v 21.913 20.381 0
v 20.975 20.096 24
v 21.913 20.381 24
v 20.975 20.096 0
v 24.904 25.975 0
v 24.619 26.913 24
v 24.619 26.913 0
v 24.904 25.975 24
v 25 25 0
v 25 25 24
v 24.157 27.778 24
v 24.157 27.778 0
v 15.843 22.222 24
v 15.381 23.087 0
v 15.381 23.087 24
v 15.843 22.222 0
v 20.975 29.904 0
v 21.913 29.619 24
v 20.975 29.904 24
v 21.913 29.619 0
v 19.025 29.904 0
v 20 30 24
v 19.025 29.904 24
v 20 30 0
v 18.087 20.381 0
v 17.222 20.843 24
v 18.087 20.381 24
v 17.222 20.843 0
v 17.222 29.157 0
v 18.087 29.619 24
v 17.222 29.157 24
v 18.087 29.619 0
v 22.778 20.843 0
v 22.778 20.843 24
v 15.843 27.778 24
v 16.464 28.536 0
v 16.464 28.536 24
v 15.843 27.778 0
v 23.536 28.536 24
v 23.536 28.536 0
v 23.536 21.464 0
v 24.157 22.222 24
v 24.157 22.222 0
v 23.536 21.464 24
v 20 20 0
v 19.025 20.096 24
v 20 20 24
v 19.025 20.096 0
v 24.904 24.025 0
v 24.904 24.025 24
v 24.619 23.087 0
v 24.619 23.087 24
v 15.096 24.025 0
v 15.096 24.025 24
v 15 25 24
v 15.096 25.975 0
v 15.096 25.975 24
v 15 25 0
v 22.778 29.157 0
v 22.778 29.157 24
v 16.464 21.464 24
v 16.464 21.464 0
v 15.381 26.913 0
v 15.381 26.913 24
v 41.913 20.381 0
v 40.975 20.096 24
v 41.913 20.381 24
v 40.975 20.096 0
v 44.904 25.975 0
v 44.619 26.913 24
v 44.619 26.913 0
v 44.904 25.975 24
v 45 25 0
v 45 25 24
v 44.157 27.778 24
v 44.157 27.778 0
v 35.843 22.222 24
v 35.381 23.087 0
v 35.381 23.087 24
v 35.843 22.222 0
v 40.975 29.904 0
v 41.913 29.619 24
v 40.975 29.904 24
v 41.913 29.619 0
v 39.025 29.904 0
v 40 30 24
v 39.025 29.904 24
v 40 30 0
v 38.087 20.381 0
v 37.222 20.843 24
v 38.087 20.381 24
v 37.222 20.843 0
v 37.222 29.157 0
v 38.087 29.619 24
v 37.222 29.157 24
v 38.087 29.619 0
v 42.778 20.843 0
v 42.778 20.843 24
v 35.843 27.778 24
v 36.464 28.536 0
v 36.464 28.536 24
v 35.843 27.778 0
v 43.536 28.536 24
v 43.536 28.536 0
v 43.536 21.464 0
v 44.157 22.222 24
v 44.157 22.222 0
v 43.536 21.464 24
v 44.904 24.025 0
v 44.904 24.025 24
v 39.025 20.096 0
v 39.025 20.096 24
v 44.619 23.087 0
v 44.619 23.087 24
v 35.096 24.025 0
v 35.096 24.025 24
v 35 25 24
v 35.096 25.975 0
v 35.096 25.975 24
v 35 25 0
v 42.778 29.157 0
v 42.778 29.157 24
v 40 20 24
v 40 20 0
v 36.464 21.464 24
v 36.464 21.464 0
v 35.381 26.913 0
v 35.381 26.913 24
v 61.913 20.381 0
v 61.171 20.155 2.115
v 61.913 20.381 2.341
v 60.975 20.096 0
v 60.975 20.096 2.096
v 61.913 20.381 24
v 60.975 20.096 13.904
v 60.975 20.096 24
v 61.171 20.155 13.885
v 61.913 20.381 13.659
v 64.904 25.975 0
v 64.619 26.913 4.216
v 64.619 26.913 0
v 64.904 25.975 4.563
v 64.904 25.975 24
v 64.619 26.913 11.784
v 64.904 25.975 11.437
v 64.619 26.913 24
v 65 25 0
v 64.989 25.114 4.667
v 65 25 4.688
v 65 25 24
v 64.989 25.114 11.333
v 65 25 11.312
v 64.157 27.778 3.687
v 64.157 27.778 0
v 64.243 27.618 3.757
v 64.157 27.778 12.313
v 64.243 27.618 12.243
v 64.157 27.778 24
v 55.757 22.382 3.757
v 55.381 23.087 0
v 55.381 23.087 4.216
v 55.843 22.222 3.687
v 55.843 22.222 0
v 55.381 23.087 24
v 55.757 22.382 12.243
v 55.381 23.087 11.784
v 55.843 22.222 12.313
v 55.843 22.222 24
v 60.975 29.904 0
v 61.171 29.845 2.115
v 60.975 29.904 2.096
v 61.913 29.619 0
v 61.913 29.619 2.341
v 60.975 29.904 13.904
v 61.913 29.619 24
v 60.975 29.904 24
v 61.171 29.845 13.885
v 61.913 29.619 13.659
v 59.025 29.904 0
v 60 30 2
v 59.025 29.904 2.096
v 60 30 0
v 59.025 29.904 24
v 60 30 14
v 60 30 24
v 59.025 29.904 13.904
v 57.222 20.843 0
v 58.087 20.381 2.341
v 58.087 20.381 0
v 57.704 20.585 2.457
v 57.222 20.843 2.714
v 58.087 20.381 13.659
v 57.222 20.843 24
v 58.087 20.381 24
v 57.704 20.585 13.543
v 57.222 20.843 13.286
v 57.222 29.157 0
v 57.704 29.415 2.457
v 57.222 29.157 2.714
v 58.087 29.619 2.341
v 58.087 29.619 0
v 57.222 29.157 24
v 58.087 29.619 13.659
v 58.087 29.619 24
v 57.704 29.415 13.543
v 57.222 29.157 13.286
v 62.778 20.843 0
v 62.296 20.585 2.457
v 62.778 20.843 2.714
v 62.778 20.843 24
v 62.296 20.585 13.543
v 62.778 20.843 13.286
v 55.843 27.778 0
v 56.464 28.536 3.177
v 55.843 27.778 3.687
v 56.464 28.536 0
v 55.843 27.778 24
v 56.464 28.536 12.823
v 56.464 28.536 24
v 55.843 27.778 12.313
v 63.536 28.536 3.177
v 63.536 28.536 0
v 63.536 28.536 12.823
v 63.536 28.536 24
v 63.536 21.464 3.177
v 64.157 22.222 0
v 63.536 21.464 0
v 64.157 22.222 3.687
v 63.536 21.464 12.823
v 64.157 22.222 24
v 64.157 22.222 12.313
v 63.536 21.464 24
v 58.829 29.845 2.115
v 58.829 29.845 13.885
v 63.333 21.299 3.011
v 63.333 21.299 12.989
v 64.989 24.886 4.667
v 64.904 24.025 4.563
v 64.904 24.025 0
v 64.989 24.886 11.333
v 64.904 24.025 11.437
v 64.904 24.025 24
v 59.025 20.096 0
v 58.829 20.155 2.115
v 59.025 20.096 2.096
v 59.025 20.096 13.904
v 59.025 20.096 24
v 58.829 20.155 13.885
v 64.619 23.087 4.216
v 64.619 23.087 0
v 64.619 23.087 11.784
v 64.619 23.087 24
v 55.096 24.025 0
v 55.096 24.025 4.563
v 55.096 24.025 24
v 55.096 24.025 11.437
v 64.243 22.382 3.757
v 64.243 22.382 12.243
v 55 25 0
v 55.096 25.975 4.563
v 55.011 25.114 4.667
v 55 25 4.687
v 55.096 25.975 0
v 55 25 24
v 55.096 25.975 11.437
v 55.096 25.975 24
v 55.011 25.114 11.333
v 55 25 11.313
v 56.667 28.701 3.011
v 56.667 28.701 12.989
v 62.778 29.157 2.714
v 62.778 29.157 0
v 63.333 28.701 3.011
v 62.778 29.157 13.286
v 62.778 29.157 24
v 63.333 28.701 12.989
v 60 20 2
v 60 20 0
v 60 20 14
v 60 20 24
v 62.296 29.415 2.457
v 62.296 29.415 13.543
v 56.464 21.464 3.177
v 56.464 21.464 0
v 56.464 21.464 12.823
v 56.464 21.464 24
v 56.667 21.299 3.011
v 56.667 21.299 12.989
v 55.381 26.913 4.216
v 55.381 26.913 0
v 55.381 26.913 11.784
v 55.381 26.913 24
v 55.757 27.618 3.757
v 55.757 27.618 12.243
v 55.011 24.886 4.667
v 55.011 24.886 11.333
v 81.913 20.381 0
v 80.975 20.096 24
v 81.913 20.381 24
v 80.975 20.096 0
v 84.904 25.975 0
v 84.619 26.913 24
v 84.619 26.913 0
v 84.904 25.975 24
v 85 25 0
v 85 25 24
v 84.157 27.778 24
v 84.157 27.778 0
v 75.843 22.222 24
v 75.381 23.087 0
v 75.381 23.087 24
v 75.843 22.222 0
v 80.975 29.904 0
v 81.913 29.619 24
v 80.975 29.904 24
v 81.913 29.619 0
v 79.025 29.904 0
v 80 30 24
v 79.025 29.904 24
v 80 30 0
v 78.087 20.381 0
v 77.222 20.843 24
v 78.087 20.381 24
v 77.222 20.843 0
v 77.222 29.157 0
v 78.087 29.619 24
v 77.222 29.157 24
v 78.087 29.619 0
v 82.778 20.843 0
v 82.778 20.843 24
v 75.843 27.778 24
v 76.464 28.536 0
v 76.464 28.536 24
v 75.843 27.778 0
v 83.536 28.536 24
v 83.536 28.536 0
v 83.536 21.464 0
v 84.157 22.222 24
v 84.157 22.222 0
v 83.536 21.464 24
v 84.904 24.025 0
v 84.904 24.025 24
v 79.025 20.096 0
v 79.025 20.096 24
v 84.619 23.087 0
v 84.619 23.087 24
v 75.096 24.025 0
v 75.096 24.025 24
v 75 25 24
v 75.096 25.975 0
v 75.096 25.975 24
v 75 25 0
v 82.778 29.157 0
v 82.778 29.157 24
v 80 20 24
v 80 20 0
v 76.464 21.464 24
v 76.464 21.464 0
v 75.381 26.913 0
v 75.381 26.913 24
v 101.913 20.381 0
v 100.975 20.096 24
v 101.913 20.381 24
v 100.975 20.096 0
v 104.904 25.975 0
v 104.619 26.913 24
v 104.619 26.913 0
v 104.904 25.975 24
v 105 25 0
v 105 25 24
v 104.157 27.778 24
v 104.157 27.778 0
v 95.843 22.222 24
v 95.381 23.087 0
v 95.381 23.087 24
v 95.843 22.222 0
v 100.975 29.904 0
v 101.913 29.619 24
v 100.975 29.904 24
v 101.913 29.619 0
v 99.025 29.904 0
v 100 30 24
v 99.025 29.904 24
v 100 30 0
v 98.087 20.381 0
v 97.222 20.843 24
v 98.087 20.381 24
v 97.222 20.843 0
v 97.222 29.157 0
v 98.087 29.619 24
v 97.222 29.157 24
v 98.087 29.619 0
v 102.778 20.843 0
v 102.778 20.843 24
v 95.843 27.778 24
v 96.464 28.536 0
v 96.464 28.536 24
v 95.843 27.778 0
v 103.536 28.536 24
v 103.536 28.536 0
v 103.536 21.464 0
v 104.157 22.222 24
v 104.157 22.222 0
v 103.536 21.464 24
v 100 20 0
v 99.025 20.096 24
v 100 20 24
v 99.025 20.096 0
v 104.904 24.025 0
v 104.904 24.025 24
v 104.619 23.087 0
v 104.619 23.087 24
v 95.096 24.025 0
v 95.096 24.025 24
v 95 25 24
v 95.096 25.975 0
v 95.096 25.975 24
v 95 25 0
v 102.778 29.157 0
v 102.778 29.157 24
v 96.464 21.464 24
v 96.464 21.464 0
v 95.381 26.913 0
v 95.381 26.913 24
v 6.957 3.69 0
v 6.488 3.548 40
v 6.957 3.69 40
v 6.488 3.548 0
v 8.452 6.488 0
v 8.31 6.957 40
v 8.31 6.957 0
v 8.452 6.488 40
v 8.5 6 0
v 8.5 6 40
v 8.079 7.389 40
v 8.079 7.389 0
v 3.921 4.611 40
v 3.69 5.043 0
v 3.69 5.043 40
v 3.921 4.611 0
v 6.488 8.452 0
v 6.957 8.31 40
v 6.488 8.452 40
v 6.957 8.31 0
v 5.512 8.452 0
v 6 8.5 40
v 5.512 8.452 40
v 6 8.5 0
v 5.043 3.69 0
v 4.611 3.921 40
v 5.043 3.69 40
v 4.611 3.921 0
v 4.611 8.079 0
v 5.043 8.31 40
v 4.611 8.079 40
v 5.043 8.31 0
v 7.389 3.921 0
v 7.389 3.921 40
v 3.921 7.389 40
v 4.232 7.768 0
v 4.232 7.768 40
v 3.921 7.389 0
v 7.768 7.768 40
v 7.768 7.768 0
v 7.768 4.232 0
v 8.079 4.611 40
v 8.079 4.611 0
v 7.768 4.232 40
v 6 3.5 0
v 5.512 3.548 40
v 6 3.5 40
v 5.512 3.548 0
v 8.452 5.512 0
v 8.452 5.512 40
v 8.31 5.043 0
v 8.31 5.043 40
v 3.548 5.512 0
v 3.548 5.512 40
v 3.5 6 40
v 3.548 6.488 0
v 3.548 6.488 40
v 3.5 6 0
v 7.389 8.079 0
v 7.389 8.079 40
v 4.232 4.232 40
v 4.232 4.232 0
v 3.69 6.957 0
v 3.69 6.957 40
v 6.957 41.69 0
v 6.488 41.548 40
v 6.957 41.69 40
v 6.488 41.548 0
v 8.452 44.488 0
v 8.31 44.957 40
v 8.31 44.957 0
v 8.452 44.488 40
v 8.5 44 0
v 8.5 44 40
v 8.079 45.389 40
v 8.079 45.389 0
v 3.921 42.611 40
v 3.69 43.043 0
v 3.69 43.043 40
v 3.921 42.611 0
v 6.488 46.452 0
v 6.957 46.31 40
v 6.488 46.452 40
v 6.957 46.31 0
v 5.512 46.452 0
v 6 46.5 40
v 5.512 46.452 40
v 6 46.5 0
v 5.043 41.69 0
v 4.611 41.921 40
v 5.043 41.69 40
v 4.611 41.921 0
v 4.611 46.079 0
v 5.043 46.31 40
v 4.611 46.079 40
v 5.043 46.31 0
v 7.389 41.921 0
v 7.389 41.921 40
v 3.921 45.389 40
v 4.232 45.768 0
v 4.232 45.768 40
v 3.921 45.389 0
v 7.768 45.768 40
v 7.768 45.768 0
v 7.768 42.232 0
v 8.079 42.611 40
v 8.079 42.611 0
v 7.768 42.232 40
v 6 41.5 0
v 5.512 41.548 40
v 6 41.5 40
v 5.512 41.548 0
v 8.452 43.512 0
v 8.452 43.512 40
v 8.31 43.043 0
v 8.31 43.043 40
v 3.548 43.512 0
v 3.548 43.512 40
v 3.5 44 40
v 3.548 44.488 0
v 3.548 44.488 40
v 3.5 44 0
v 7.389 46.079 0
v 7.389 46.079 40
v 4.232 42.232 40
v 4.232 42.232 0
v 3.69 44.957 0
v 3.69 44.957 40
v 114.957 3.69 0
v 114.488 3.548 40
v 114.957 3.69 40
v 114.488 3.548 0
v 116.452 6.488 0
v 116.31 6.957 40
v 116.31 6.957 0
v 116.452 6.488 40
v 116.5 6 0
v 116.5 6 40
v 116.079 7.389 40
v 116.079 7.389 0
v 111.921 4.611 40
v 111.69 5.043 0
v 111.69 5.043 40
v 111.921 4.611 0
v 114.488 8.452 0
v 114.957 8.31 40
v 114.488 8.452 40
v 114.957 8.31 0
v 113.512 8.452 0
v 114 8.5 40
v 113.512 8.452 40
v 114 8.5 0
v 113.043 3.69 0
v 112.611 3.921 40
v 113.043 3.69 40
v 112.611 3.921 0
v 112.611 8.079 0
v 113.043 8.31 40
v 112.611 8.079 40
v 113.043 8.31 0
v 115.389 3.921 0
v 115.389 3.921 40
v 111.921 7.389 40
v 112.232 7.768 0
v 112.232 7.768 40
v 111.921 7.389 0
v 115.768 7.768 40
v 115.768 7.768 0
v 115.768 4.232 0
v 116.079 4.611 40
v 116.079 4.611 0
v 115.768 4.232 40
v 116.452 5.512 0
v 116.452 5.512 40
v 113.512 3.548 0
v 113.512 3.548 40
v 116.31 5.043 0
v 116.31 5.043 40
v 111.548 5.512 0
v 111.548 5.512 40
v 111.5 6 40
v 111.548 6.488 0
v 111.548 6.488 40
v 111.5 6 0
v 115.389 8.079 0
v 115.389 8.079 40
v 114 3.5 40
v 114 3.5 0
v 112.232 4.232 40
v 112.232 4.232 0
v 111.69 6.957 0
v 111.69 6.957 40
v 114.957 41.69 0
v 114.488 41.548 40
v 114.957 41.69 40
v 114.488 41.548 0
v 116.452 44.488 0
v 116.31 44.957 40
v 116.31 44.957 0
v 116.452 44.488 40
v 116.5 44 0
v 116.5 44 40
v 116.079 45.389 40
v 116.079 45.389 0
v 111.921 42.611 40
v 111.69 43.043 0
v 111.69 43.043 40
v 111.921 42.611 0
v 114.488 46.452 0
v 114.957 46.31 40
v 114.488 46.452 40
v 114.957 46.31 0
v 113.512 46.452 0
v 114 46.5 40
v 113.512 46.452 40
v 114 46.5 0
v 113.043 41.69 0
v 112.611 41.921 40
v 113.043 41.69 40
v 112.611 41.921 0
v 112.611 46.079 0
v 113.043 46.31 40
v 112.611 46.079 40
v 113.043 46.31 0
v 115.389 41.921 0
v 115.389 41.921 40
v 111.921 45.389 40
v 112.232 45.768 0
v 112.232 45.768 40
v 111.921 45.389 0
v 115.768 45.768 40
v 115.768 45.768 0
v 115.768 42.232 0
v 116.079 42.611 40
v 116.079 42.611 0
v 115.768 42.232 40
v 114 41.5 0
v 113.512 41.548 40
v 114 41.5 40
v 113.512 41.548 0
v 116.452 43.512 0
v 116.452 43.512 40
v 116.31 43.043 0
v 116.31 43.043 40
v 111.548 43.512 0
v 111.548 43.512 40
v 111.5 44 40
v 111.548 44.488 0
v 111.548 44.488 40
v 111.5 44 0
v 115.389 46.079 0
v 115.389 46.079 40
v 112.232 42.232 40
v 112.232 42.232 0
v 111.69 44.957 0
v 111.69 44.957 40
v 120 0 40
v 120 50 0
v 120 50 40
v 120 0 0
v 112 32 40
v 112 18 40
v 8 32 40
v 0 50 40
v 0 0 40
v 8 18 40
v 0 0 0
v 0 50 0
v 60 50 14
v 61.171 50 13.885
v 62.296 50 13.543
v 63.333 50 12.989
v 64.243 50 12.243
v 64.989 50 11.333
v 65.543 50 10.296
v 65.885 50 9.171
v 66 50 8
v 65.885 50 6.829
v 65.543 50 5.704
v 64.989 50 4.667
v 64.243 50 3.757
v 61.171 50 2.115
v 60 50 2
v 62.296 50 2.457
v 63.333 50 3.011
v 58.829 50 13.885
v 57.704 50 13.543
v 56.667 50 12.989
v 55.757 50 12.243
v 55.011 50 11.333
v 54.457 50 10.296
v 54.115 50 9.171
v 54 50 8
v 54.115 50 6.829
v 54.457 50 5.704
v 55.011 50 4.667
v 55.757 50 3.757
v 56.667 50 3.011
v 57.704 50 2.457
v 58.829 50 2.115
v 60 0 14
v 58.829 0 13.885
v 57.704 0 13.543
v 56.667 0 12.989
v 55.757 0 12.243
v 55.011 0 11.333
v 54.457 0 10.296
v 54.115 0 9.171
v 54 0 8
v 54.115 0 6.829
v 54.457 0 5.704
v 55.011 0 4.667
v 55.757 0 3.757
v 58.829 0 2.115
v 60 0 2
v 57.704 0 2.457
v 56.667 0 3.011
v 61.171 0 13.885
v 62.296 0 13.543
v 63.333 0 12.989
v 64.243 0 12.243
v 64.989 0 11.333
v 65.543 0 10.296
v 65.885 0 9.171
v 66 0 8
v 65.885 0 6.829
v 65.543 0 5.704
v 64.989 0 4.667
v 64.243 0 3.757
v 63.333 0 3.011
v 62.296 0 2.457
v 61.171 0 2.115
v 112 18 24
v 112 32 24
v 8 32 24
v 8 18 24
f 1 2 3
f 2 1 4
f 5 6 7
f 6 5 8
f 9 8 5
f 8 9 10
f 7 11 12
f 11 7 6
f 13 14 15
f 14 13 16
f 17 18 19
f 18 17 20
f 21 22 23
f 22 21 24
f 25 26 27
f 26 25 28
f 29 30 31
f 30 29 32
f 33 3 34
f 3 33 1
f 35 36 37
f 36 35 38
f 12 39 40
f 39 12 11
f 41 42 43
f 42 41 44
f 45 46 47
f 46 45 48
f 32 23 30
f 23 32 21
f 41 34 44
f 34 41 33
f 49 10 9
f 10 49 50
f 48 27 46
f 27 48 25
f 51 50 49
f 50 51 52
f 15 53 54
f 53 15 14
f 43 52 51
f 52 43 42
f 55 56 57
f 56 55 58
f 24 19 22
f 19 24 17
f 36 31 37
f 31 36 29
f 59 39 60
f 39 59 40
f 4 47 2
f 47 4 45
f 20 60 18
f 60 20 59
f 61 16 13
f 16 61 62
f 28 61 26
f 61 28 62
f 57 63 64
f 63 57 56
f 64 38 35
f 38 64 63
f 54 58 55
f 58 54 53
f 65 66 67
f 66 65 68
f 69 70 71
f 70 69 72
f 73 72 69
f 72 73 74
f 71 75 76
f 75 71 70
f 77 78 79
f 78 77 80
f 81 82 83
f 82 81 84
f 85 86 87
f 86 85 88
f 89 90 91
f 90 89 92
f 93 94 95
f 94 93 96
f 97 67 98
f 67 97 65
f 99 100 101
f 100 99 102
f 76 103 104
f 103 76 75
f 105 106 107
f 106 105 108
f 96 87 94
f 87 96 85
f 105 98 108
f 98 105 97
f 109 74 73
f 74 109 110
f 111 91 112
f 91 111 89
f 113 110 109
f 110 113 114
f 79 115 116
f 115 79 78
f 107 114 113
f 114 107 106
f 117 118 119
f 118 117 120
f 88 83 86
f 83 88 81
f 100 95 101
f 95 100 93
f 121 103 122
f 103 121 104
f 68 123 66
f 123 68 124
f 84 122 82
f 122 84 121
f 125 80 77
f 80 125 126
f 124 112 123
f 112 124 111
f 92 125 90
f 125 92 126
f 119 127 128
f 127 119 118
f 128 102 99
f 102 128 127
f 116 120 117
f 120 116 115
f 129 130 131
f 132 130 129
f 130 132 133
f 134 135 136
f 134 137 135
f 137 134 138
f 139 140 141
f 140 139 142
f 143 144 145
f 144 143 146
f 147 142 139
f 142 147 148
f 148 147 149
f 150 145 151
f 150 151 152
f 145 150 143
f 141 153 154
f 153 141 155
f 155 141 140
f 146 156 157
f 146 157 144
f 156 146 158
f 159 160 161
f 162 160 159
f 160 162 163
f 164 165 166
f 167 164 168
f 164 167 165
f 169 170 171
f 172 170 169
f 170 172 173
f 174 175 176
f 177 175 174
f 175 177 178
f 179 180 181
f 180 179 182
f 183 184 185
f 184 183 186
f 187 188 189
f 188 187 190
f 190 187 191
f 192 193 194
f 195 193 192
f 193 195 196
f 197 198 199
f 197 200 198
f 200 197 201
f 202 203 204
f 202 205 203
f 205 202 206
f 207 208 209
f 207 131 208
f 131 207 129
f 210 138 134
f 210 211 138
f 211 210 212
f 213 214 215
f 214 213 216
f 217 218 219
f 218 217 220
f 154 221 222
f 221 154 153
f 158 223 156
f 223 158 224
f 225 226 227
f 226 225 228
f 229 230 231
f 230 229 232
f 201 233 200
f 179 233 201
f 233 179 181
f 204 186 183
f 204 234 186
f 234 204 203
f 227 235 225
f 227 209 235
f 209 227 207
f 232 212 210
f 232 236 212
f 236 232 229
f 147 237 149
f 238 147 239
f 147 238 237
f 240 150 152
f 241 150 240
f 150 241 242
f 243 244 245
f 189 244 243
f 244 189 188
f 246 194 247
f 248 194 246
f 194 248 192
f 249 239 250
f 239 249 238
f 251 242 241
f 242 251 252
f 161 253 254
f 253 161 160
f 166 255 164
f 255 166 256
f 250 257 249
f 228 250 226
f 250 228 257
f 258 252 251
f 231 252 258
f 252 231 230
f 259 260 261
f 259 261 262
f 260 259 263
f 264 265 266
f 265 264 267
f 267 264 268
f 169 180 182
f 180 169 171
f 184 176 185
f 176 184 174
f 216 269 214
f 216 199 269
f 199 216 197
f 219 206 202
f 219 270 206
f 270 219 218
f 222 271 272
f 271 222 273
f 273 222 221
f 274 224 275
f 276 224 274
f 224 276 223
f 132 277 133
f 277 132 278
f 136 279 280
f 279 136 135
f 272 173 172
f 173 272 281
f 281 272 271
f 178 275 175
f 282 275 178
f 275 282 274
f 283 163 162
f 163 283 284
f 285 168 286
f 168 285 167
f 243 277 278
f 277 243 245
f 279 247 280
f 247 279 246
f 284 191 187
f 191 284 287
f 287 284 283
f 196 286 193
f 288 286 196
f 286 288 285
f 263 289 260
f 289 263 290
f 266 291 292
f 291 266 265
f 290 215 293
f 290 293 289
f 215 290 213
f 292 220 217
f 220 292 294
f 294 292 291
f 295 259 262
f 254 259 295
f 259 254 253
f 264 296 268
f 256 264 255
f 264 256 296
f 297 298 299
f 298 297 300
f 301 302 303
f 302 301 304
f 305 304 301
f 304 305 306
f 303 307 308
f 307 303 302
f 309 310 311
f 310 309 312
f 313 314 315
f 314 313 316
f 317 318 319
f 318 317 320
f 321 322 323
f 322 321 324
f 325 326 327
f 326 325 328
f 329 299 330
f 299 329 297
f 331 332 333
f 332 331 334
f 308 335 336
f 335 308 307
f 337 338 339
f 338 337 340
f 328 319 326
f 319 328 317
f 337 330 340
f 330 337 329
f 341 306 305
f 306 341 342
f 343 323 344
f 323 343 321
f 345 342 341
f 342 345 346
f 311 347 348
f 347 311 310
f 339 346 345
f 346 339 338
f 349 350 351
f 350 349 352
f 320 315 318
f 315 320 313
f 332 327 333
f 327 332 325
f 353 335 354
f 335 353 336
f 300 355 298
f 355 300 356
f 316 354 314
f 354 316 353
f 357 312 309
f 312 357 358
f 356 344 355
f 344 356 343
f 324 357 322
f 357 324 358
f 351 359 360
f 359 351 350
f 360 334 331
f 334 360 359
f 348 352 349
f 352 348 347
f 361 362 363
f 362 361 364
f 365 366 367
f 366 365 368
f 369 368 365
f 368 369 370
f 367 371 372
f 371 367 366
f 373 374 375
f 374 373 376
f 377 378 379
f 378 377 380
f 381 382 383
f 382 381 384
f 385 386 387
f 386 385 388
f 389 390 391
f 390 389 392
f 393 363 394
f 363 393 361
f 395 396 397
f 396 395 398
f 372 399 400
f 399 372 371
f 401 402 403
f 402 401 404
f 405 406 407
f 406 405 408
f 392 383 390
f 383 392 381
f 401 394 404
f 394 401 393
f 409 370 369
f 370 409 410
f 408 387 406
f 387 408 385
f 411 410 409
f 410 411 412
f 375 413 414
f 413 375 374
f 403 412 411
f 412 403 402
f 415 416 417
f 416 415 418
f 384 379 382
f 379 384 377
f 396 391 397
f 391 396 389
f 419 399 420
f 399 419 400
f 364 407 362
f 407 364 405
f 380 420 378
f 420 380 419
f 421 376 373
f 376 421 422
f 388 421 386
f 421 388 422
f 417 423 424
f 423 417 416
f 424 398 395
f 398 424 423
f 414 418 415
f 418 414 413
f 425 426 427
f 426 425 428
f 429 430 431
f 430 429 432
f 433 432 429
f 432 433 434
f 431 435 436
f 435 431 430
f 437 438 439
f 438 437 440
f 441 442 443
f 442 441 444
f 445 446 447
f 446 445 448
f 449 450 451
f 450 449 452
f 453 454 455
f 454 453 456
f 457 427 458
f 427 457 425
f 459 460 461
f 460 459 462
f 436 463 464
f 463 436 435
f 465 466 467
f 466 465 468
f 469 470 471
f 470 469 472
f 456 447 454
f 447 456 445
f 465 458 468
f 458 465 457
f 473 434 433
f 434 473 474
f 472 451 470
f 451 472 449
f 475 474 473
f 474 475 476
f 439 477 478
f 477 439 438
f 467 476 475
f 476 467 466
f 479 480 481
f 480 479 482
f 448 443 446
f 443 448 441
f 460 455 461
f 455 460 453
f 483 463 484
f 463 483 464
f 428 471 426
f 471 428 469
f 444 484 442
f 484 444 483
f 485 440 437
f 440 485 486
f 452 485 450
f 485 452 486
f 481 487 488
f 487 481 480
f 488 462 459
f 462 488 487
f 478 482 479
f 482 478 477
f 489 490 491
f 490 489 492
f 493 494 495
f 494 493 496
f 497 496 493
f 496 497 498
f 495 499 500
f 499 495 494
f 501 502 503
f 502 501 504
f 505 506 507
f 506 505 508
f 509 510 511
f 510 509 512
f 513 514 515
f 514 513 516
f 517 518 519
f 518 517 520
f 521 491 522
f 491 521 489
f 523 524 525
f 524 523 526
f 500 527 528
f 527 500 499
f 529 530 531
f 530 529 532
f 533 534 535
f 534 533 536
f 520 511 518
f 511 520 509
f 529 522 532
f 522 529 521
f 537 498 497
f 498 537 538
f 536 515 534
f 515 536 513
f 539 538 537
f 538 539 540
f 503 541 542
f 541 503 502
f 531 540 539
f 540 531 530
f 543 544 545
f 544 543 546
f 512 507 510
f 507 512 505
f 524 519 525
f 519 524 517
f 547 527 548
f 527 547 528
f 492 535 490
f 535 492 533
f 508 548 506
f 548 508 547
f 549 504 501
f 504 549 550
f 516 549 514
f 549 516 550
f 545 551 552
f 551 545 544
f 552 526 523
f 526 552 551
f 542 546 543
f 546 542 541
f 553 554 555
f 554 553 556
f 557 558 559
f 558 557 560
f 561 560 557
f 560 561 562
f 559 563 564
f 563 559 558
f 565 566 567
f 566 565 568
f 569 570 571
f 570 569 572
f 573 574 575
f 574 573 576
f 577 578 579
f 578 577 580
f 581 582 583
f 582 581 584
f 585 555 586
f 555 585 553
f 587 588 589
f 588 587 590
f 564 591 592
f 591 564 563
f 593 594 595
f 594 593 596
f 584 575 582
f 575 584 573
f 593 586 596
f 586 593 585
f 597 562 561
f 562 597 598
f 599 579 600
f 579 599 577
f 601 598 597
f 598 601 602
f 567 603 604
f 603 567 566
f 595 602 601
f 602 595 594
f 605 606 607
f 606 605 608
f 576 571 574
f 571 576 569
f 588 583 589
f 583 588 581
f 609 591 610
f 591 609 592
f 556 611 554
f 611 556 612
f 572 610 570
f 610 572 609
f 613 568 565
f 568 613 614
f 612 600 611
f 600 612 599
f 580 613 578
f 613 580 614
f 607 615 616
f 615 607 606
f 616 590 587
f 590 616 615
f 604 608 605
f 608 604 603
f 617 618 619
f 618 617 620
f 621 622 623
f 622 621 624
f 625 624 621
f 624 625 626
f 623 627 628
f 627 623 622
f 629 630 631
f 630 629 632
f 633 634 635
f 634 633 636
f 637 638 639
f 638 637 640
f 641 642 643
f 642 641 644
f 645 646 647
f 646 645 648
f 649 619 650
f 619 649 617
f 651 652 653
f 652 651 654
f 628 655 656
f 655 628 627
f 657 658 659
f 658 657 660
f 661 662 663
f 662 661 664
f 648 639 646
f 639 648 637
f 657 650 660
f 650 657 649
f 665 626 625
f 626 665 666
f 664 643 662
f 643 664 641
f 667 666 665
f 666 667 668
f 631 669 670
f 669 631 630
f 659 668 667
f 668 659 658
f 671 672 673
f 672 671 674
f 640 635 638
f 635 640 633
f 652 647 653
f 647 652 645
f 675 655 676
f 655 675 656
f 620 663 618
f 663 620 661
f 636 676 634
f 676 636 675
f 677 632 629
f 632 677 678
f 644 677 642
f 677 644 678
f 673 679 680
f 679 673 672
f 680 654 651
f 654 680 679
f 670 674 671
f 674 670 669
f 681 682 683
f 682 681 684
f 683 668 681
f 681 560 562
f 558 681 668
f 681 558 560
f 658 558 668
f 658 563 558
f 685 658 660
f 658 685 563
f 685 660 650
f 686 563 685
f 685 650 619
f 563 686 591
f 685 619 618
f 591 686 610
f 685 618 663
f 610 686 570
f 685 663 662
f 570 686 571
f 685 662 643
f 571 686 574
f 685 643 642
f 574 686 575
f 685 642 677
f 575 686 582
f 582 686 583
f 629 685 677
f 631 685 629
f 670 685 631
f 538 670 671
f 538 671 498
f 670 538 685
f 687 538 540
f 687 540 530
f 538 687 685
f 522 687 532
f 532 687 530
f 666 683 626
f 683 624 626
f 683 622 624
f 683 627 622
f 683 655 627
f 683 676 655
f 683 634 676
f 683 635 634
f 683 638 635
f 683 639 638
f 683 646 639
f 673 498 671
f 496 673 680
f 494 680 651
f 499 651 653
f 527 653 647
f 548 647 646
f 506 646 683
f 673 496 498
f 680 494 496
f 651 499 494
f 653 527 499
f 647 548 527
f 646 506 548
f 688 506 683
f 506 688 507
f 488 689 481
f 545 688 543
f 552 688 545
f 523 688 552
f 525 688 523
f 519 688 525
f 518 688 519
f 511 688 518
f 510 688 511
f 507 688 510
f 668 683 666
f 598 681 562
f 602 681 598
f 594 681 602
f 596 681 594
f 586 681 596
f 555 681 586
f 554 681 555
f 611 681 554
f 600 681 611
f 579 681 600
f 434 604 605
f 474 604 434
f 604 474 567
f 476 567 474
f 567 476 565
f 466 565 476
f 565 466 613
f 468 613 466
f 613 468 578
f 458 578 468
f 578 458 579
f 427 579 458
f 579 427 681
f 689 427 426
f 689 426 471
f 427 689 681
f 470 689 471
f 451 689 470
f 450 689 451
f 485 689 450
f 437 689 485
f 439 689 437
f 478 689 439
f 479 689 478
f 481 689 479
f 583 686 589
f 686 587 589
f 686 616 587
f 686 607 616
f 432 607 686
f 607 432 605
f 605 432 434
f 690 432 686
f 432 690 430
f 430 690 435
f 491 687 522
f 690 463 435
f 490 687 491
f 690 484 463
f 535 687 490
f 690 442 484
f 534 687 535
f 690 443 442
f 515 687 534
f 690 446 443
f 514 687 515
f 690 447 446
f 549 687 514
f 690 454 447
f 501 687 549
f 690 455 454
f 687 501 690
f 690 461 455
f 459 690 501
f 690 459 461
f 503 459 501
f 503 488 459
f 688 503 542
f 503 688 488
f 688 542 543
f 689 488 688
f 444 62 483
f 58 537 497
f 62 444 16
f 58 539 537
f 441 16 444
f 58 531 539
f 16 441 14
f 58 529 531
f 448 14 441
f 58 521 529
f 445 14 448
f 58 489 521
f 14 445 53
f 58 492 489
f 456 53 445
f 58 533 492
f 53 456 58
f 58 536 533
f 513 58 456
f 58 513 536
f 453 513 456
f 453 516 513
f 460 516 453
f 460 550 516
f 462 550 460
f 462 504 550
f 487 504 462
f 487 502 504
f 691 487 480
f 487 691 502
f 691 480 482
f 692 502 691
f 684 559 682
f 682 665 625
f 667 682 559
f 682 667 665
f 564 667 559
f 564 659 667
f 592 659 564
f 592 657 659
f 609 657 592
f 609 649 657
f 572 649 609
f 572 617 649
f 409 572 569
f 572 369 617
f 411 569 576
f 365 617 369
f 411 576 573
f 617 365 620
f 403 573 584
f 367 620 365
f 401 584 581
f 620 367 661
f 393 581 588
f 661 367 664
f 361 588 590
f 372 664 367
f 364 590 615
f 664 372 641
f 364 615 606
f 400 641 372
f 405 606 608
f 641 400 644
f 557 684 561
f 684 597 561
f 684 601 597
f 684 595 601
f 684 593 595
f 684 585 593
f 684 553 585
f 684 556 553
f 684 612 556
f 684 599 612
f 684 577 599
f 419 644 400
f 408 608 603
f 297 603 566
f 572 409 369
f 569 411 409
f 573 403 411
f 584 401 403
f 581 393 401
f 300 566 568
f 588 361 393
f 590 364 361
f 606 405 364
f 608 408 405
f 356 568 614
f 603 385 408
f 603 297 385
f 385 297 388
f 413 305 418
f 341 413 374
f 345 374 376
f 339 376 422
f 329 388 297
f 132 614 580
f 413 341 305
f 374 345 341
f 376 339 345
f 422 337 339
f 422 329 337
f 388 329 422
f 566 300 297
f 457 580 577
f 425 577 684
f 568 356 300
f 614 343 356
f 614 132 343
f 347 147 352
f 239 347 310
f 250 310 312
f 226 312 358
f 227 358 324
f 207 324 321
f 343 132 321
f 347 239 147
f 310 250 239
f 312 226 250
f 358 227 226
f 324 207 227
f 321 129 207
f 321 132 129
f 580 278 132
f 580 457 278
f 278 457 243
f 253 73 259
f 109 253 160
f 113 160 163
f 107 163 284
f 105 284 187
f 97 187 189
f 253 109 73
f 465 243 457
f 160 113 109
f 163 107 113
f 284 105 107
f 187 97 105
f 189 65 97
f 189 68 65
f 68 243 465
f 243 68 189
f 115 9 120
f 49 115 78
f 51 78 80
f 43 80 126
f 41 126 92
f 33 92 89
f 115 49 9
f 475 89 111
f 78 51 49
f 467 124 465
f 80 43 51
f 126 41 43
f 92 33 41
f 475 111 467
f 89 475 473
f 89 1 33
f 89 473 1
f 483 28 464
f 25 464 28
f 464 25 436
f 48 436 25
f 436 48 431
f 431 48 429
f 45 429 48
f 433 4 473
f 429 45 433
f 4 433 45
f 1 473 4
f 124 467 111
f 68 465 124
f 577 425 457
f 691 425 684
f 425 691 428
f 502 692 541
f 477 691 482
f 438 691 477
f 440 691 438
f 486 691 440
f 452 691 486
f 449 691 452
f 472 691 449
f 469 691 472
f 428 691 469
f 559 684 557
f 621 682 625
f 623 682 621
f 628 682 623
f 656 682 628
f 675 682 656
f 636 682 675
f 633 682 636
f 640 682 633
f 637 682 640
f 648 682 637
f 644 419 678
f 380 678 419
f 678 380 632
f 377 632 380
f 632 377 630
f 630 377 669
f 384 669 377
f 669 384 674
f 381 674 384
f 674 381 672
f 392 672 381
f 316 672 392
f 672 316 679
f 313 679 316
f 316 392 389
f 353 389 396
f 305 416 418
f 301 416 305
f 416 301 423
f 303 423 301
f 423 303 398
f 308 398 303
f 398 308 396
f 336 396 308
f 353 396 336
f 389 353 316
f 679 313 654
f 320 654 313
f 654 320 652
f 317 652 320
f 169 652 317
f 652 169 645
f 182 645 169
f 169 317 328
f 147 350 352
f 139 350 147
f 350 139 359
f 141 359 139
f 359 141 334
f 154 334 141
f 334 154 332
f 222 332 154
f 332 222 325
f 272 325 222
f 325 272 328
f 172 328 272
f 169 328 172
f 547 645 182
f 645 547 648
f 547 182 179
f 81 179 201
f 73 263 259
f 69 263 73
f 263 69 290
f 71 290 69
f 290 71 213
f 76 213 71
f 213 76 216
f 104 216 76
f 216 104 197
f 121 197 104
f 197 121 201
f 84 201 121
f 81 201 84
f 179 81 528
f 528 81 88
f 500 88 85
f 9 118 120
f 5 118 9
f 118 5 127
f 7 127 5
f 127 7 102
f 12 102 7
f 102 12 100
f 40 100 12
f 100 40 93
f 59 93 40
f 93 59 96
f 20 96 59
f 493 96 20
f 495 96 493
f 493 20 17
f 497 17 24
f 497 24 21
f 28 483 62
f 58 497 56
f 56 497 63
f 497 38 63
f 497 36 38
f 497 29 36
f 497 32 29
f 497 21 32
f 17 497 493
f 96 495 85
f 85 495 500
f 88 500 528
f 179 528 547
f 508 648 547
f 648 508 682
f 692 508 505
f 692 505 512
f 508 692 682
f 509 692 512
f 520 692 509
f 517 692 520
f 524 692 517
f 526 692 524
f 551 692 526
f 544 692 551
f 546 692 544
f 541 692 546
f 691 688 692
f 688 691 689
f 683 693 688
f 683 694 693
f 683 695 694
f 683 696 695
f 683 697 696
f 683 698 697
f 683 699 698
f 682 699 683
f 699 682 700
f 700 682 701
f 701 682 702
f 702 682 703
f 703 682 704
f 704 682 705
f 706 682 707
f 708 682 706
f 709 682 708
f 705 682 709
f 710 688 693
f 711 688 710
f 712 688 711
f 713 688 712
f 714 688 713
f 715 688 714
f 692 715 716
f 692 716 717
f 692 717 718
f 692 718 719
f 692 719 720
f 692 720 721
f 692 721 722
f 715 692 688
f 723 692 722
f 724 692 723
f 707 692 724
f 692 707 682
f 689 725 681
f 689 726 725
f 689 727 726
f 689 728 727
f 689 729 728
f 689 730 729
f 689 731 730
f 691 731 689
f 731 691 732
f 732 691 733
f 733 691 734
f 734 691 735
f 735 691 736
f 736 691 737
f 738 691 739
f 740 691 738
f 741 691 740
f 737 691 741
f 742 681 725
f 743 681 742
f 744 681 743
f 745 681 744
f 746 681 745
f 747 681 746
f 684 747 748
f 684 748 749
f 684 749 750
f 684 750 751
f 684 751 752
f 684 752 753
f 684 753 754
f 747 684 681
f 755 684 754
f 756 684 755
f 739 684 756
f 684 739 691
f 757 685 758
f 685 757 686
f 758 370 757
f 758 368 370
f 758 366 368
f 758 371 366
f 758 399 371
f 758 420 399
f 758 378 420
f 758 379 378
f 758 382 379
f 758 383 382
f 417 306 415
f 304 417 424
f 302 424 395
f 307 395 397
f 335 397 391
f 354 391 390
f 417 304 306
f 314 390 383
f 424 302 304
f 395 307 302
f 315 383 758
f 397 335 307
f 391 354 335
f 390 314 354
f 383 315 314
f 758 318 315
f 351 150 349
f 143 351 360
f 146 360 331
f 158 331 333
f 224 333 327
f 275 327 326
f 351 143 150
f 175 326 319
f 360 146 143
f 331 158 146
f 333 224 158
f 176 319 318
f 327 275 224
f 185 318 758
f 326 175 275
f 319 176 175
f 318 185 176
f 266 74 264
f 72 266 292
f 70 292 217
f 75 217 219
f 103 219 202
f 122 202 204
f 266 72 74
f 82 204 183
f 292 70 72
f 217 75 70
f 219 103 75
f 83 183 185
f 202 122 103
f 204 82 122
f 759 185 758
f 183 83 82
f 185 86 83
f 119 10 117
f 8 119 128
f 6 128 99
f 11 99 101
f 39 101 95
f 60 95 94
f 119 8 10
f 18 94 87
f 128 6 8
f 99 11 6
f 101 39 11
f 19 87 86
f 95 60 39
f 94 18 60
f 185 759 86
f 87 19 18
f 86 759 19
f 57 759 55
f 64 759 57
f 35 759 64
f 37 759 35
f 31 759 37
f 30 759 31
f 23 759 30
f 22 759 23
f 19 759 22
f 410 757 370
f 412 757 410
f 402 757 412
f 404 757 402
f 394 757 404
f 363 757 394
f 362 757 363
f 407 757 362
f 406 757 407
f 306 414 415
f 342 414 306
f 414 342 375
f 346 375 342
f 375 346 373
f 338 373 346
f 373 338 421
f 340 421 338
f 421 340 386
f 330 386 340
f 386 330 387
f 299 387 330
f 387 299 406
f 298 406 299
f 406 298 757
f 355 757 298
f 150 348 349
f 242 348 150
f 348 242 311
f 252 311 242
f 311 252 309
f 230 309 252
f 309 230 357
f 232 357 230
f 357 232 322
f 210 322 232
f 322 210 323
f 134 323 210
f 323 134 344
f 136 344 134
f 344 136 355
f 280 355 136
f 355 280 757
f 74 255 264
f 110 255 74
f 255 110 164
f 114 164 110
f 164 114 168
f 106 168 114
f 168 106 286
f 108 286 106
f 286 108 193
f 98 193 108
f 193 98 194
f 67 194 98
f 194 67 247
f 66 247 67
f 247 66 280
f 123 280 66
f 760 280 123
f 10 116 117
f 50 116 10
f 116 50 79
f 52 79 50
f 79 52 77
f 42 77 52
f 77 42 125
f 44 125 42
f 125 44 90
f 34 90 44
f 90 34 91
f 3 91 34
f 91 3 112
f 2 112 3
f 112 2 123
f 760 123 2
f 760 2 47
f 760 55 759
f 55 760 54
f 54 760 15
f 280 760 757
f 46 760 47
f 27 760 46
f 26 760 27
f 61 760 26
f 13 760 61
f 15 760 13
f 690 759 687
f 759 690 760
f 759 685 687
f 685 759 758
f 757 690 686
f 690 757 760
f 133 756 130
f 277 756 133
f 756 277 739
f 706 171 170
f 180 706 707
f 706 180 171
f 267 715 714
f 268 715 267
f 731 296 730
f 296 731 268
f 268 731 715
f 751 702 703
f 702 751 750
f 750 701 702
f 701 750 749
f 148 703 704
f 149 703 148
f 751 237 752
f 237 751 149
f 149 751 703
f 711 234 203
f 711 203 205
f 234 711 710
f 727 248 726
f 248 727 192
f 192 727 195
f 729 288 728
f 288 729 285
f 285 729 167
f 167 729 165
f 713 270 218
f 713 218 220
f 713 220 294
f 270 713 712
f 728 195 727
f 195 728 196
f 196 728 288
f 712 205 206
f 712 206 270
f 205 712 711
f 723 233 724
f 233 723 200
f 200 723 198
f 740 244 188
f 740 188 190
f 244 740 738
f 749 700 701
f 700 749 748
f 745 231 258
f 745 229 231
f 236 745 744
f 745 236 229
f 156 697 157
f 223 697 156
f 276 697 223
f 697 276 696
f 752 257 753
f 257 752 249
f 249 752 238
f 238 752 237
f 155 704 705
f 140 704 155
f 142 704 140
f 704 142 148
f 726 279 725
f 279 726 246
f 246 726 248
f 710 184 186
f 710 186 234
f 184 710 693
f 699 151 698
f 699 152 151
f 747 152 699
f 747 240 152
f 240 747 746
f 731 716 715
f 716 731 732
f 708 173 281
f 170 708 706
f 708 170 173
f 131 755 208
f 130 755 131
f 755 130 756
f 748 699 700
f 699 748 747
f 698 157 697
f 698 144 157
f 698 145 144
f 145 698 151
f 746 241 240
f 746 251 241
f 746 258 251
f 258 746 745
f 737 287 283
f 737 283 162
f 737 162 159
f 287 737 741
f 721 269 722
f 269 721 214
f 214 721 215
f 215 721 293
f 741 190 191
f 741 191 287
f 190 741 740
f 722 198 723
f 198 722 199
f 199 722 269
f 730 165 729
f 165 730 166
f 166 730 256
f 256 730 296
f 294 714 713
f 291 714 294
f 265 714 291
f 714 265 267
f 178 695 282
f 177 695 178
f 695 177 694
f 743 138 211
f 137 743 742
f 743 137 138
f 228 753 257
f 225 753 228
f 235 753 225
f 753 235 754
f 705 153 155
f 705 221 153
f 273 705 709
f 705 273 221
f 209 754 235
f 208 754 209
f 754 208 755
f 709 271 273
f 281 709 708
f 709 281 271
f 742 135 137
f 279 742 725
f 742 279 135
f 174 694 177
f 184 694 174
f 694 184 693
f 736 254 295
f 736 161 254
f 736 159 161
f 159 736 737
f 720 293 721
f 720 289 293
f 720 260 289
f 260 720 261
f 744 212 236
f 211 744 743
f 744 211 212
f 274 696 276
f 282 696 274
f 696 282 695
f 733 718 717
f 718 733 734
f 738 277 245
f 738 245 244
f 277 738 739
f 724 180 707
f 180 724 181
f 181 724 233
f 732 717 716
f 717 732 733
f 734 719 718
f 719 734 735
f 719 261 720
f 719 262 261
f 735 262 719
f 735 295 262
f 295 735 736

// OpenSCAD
$fn = 32;

// ----------------------------------------------------------------------
// Manifold block: side_outlet manifold
// ----------------------------------------------------------------------

// --- parameters (mm) ---
block_l = 120;            // block length, X
block_w = 50;             // block width, Y
block_h = 40;             // block height, Z
port_d = 10;              // port bore diameter
port_pitch = 20;          // port pitch along X
gallery_d = 14;           // top gallery width, Y
gallery_depth = 16;       // gallery pocket depth
wall_p = 8;               // gallery end wall thickness, X
mnt_d = 5;                // mounting hole diameter
mnt_in = 6;               // mounting hole inset from the edges
out_d = 12;               // outlet bore diameter
out_z = 8;                // outlet axis height

n_ports = 5;  // ports in the row
port_x0 = (block_l - (n_ports - 1) * port_pitch) / 2;  // first port X

difference() {
  cube([block_l, block_w, block_h]);
  for (i = [0 : n_ports - 1])
    translate([port_x0 + i * port_pitch, block_w / 2, -1])
      cylinder(h = block_h + 2, d = port_d);
  translate([wall_p, block_w / 2 - gallery_d / 2, block_h - gallery_depth])
    cube([block_l - 2 * wall_p, gallery_d, gallery_depth + 1]);
  for (cx = [mnt_in, block_l - mnt_in])
    for (cy = [mnt_in, block_w - mnt_in])
      translate([cx, cy, -1]) cylinder(h = block_h + 2, d = mnt_d);
  translate([block_l / 2, -1, out_z]) rotate([-90, 0, 0])
    cylinder(h = block_w + 2, d = out_d);
}
